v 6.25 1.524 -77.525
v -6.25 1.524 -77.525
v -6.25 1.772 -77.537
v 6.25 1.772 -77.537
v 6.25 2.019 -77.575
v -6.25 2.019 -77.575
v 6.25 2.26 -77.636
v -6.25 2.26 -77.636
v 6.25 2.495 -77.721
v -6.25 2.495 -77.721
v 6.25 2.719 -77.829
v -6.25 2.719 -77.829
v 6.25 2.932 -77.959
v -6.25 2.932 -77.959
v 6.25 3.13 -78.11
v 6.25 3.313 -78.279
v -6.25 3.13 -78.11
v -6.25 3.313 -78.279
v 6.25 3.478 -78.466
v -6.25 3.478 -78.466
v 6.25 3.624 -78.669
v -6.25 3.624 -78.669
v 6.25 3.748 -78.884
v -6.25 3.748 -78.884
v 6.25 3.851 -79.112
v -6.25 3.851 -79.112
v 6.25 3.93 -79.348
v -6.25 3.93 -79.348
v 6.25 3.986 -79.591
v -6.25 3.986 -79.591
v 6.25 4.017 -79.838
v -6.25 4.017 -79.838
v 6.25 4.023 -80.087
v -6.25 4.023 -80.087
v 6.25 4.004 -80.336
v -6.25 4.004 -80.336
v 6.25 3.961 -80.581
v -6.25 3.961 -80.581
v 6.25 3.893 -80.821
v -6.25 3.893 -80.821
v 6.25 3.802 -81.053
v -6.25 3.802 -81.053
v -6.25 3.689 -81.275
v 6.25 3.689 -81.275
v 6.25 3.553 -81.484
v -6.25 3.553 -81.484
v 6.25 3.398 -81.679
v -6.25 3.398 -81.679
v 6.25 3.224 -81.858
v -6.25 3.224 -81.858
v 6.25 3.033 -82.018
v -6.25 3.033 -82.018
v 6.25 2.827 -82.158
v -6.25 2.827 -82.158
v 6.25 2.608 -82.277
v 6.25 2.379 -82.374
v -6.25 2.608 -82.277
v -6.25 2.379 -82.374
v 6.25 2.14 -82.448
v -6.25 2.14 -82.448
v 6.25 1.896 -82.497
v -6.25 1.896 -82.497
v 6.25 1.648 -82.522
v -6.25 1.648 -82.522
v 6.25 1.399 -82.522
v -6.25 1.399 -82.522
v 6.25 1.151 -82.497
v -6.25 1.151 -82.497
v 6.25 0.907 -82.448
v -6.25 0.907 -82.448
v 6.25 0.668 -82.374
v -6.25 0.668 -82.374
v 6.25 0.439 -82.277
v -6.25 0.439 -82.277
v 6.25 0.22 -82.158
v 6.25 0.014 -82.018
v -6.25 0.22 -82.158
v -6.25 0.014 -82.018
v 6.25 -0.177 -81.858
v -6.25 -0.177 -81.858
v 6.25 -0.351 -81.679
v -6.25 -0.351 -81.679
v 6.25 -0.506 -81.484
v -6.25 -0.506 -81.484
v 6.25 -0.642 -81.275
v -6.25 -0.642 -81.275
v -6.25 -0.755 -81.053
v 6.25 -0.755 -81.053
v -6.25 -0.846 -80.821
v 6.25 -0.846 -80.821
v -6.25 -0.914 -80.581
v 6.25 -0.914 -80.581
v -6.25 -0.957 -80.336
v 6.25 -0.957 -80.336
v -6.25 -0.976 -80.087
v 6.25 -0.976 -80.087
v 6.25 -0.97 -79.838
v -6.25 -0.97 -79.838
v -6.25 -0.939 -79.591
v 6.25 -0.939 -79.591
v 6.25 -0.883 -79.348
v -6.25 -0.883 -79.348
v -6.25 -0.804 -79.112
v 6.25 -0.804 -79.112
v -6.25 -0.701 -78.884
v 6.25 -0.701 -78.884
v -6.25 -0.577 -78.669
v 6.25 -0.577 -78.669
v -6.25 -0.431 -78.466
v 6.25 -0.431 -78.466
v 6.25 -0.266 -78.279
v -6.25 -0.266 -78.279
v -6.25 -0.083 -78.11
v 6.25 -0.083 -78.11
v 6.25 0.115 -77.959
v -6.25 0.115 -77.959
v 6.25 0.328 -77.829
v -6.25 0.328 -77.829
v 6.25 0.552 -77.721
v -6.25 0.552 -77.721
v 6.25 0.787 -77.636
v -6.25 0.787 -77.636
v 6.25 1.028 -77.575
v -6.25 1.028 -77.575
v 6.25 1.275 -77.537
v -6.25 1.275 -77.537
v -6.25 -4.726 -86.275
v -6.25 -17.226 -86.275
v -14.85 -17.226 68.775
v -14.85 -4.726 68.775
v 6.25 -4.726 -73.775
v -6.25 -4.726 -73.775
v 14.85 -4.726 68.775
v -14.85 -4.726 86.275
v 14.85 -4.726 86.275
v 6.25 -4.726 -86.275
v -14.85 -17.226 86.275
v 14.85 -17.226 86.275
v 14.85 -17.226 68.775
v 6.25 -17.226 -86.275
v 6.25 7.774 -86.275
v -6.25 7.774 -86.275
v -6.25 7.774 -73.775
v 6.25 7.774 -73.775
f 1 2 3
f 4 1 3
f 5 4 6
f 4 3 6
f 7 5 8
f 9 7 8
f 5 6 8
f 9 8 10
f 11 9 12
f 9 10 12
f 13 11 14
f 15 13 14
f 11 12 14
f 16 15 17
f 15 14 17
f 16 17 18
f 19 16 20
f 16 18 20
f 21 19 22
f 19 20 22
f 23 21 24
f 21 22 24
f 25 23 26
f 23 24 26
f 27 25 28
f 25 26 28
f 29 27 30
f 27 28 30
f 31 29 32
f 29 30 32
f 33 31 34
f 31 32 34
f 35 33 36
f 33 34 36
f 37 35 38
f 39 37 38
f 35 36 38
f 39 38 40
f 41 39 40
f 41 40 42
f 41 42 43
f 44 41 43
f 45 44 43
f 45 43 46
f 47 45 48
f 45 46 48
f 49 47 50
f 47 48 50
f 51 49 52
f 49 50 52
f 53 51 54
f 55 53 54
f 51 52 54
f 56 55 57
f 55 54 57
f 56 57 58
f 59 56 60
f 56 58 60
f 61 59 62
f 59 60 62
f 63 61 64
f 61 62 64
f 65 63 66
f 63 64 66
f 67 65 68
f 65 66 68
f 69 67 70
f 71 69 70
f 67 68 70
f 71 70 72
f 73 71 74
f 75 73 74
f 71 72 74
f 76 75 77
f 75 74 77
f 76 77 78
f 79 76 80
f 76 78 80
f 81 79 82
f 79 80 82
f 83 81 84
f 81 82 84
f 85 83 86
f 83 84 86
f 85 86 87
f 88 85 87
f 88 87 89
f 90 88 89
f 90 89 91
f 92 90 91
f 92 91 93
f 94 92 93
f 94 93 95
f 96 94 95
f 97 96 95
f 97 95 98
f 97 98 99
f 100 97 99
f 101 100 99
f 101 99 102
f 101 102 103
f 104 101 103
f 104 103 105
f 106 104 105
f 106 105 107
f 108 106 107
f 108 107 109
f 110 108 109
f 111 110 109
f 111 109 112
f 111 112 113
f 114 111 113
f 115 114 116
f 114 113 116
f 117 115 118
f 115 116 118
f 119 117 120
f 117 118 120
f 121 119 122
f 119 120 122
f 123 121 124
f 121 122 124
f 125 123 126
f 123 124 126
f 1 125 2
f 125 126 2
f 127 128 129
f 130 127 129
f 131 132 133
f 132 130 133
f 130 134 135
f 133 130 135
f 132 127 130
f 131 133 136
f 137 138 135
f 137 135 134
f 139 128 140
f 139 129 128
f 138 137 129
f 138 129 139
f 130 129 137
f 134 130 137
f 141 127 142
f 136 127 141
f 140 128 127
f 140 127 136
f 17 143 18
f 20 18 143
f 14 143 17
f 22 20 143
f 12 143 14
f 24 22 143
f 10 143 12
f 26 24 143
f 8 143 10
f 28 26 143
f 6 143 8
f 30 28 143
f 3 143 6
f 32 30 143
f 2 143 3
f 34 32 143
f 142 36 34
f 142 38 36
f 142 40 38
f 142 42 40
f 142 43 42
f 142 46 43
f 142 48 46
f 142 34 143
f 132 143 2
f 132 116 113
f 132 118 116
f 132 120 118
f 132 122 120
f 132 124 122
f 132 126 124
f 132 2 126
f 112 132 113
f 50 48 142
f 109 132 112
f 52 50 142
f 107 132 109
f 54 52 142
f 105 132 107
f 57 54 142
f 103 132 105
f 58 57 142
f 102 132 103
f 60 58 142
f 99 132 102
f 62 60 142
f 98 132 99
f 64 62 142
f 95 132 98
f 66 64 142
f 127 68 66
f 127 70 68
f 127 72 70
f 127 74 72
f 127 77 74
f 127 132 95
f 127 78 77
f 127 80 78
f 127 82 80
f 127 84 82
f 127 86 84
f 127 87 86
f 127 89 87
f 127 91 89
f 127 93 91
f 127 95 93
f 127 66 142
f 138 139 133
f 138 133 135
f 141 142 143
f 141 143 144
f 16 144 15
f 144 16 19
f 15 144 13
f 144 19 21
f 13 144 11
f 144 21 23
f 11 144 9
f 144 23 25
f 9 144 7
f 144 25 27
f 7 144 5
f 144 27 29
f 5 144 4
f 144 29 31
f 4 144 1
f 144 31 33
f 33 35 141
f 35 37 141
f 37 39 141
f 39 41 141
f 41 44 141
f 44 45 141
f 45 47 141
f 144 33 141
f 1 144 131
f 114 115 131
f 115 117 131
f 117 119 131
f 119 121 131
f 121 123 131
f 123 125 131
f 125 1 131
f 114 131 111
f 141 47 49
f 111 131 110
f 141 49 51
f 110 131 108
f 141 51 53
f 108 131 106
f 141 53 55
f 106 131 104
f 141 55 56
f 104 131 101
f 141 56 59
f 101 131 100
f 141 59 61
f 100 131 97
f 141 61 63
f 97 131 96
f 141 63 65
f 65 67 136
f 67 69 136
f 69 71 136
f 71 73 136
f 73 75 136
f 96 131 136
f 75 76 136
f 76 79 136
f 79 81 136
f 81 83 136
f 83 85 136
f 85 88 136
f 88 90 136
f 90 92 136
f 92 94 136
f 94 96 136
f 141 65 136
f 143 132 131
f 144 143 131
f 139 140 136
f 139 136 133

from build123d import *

# Parameters (mm, degrees)
SKETCH3_W            = 220
SKETCH3_H            = 220
BOSS_EXTRUDE1_DEPTH  = 10
CUT_EXTRUDE1_DEPTH   = 10
SKETCH5_W            = 450
SKETCH5_H            = 450
SKETCH5_W_2          = 400
SKETCH5_H_2          = 400
BOSS_EXTRUDE3_DEPTH  = 25
CUT_EXTRUDE2_DEPTH   = 25
SKETCH9_W            = 450
SKETCH9_H            = 50
CUT_EXTRUDE3_DEPTH   = 25
SKETCH10_W           = 450
SKETCH10_H           = 40
CUT_EXTRUDE4_DEPTH   = 25
SKETCH11_W           = 25
SKETCH11_H           = 25
BOSS_EXTRUDE5_DEPTH  = 25
SKETCH12_W           = 25
SKETCH12_H           = 25
BOSS_EXTRUDE6_DEPTH  = 25
SKETCH13_W           = 25
SKETCH13_H           = 25
BOSS_EXTRUDE7_DEPTH  = 25
SKETCH14_R           = 5
CUT_EXTRUDE5_DEPTH   = 25
BOSS_EXTRUDE8_DEPTH  = 25
BOSS_EXTRUDE9_DEPTH  = 25
CUT_EXTRUDE6_DEPTH   = 25
BOSS_EXTRUDE10_DEPTH = 25
BOSS_EXTRUDE11_DEPTH = 25
BOSS_EXTRUDE12_DEPTH = 400
BOSS_EXTRUDE13_DEPTH = 400
CUT_EXTRUDE7_DEPTH   = 450
SKETCH24_W           = 50
SKETCH24_H           = 59.452998038
CUT_EXTRUDE8_DEPTH   = 350
SKETCH25_W           = 25
SKETCH25_H           = 59.452998038
BOSS_EXTRUDE14_DEPTH = 35
SKETCH26_W           = 12.5
SKETCH26_H           = 172.55
BOSS_EXTRUDE15_DEPTH = 12.5
SKETCH27_W           = 12.5
SKETCH27_H           = 12.5
BOSS_EXTRUDE16_DEPTH = 12.5
SKETCH28_R           = 2.5
CUT_EXTRUDE9_DEPTH   = 12.5
SKETCH29_W           = 116.183817877
SKETCH29_H           = 120.115800598
CUT_EXTRUDE10_DEPTH  = 800


with BuildPart() as part:
    # Sketch3 → Boss-Extrude1 (new body)
    with BuildSketch(Plane(origin=(0, 0, 0), x_dir=(1, 0, 0), z_dir=(0, 1, 0))):
        Rectangle(SKETCH3_W, SKETCH3_H)
    extrude(amount=BOSS_EXTRUDE1_DEPTH)

    # Sketch4 → Cut-Extrude1 (cut)
    with BuildSketch(Plane(origin=(0, 10, 0), x_dir=(1, 0, 0), z_dir=(0, 1, 0))):
        Polygon((0, -110), (-110, 110), (-110, -110), align=None)
        Polygon((110, 110), (0, -110), (110, -110), align=None)
    extrude(amount=-CUT_EXTRUDE1_DEPTH, mode=Mode.SUBTRACT)

    # Sketch17 → Cut-Extrude6 (cut)
    with BuildSketch(Plane(origin=(0, 10, 0), x_dir=(1, 0, 0), z_dir=(0, 1, 0))):
        Polygon((-110, 110), (110, 110), (0, -110), align=None)
    extrude(amount=-CUT_EXTRUDE6_DEPTH, mode=Mode.SUBTRACT)


with BuildPart() as body_2:
    # Sketch5 → Boss-Extrude3 (new body)
    with BuildSketch(Plane.XZ):
        Rectangle(SKETCH5_W, SKETCH5_H)
        Rectangle(SKETCH5_W_2, SKETCH5_H_2, mode=Mode.SUBTRACT)
    extrude(amount=-BOSS_EXTRUDE3_DEPTH)

    # Sketch8 → Cut-Extrude2 (cut)
    with BuildSketch(Plane(origin=(0, 25, 0), x_dir=(1, 0, 0), z_dir=(0, 1, 0))):
        Polygon((-225, 200), (-200, 200), (225, 200), (225, 225), (-225, 225), align=None)
    extrude(amount=-CUT_EXTRUDE2_DEPTH, mode=Mode.SUBTRACT)

    # Sketch9 → Cut-Extrude3 (cut)
    with BuildSketch(Plane(origin=(0, 25, 0), x_dir=(1, 0, 0), z_dir=(0, 1, 0))):
        with Locations((0, 175)):
            Rectangle(SKETCH9_W, SKETCH9_H)
    extrude(amount=-CUT_EXTRUDE3_DEPTH, mode=Mode.SUBTRACT)

    # Sketch10 → Cut-Extrude4 (cut)
    with BuildSketch(Plane(origin=(0, 25, 0), x_dir=(1, 0, 0), z_dir=(0, 1, 0))):
        with Locations((0, 130)):
            Rectangle(SKETCH10_W, SKETCH10_H)
    extrude(amount=-CUT_EXTRUDE4_DEPTH, mode=Mode.SUBTRACT)

    # Sketch11 → Boss-Extrude5 (add)
    with BuildSketch(Plane(origin=(0, 0, -110), x_dir=(-1, 0, 0), z_dir=(0, 0, -1))):
        with Locations((212.5, 12.5)):
            Rectangle(SKETCH11_W, SKETCH11_H)
        with Locations((-212.5, 12.5)):
            Rectangle(SKETCH11_W, SKETCH11_H)
    extrude(amount=BOSS_EXTRUDE5_DEPTH)

    # Sketch12 → Boss-Extrude6 (add)
    with BuildSketch(Plane(origin=(-200, 0, 0), x_dir=(0, 0, -1), z_dir=(1, 0, 0))):
        with Locations((122.5, 12.5)):
            Rectangle(SKETCH12_W, SKETCH12_H)
    extrude(amount=BOSS_EXTRUDE6_DEPTH)

    # Sketch13 → Boss-Extrude7 (add)
    with BuildSketch(Plane.ZY.offset(-200)):
        with Locations((-122.5, 12.5)):
            Rectangle(SKETCH13_W, SKETCH13_H)
    extrude(amount=BOSS_EXTRUDE7_DEPTH)

    # Sketch14 → Cut-Extrude5 (cut)
    with BuildSketch(Plane(origin=(0, 25, 0), x_dir=(1, 0, 0), z_dir=(0, 1, 0))):
        with Locations(Location((-187.5, 122.5, 0), (0, 0, 270))):  # turned: the seam where the file's is
            Circle(SKETCH14_R)
        with Locations(Location((187.5, 122.5, 0), (0, 0, 270))):  # turned: the seam where the file's is
            Circle(SKETCH14_R)
    extrude(amount=-CUT_EXTRUDE5_DEPTH, mode=Mode.SUBTRACT)

    # Sketch15 → Boss-Extrude8 (add)
    with BuildSketch(Plane.ZY.offset(225)):
        Polygon((225, 0), (225, -20), (-135, 0), align=None)
        Polygon((225, 25), (225, 45), (-135, 25), align=None)
    extrude(amount=-BOSS_EXTRUDE8_DEPTH)

    # Sketch16 → Boss-Extrude9 (add)
    with BuildSketch(Plane(origin=(225, 0, 0), x_dir=(0, 0, -1), z_dir=(1, 0, 0))):
        Polygon((-225, 45), (-225, 25), (135, 25), align=None)
        Polygon((-225, 0), (-225, -20), (135, 0), align=None)
    extrude(amount=-BOSS_EXTRUDE9_DEPTH)

    # Sketch18 → Boss-Extrude10 (add)
    with BuildSketch(Plane.ZY.offset(225)):
        Polygon((175.07698234, 42.226499019), (225, 45), (225, 125), align=None)
        Polygon((225, -100), (225, -20), (175.07698234, -17.226499019), align=None)
    extrude(amount=-BOSS_EXTRUDE10_DEPTH)

    # Sketch19 → Boss-Extrude11 (add)
    with BuildSketch(Plane(origin=(225, 0, 0), x_dir=(0, 0, -1), z_dir=(1, 0, 0))):
        Polygon((-225, 125), (-225, 45), (-175.07698234, 42.226499019), align=None)
        Polygon((-225, -20), (-225, -100), (-175.07698234, -17.226499019), align=None)
    extrude(amount=-BOSS_EXTRUDE11_DEPTH)

    # Sketch20 → Boss-Extrude12 (add)
    with BuildSketch(Plane(origin=(-200, 0, 0), x_dir=(0, 0, -1), z_dir=(1, 0, 0))):
        Polygon((-200, 25), (-225, 125), (-225, 25), align=None)
    extrude(amount=BOSS_EXTRUDE12_DEPTH)

    # Sketch21 → Boss-Extrude13 (add)
    with BuildSketch(Plane(origin=(-200, 0, 0), x_dir=(0, 0, -1), z_dir=(1, 0, 0))):
        Polygon((-225, 0), (-225, -100), (-200, 0), align=None)
    extrude(amount=BOSS_EXTRUDE13_DEPTH)

    # Sketch22 → Cut-Extrude7 (cut)
    with BuildSketch(Plane.ZY.offset(225)):
        Polygon((175.07698234, -17.226499019), (175.07698234, 42.226499019), (225, 125), (225, -100), align=None)
    extrude(amount=-CUT_EXTRUDE7_DEPTH, mode=Mode.SUBTRACT)

    # Sketch24 → Cut-Extrude8 (cut)
    with BuildSketch(Plane.XY.offset(175.07698234)):
        with Locations((-200, 12.5)):
            Rectangle(SKETCH24_W, SKETCH24_H)
    extrude(amount=-CUT_EXTRUDE8_DEPTH, mode=Mode.SUBTRACT)

    # Sketch25 → Boss-Extrude14 (add)
    with BuildSketch(Plane.XY.offset(175.07698234)):
        with Locations((212.5, 12.5)):
            Rectangle(SKETCH25_W, SKETCH25_H)
    extrude(amount=BOSS_EXTRUDE14_DEPTH)

    # Sketch29 → Cut-Extrude10 (cut)
    with BuildSketch(Plane.XY.offset(210.07698234)):
        with Locations((211.346821748, 11.078491342)):
            Rectangle(SKETCH29_W, SKETCH29_H)
    extrude(amount=-CUT_EXTRUDE10_DEPTH, mode=Mode.SUBTRACT)


with BuildPart() as body_2_2:
    # Sketch26 → Boss-Extrude15 (new body)
    with BuildSketch(Plane.XZ.offset(17.226499019)):
        Rectangle(SKETCH26_W, SKETCH26_H)
        Polygon((14.85, 86.275), (6.25, 86.275), (6.25, -86.275), (14.85, 68.775), align=None)
        Polygon((-14.85, 68.775), (-14.85, 86.275), (-6.25, 86.275), (-6.25, -86.275), align=None)
    extrude(amount=-BOSS_EXTRUDE15_DEPTH)

    # Sketch27 → Boss-Extrude16 (add)
    with BuildSketch(Plane(origin=(0, -4.726499019, 0), x_dir=(1, 0, 0), z_dir=(0, 1, 0))):
        with Locations((0, 80.025)):
            Rectangle(SKETCH27_W, SKETCH27_H)
    extrude(amount=BOSS_EXTRUDE16_DEPTH)

    # Sketch28 → Cut-Extrude9 (cut)
    with BuildSketch(Plane.ZY.offset(6.25)):
        with Locations((-80.025, 1.523500981)):
            Circle(SKETCH28_R)
    extrude(amount=-CUT_EXTRUDE9_DEPTH, mode=Mode.SUBTRACT)


solid = body_2_2.part
